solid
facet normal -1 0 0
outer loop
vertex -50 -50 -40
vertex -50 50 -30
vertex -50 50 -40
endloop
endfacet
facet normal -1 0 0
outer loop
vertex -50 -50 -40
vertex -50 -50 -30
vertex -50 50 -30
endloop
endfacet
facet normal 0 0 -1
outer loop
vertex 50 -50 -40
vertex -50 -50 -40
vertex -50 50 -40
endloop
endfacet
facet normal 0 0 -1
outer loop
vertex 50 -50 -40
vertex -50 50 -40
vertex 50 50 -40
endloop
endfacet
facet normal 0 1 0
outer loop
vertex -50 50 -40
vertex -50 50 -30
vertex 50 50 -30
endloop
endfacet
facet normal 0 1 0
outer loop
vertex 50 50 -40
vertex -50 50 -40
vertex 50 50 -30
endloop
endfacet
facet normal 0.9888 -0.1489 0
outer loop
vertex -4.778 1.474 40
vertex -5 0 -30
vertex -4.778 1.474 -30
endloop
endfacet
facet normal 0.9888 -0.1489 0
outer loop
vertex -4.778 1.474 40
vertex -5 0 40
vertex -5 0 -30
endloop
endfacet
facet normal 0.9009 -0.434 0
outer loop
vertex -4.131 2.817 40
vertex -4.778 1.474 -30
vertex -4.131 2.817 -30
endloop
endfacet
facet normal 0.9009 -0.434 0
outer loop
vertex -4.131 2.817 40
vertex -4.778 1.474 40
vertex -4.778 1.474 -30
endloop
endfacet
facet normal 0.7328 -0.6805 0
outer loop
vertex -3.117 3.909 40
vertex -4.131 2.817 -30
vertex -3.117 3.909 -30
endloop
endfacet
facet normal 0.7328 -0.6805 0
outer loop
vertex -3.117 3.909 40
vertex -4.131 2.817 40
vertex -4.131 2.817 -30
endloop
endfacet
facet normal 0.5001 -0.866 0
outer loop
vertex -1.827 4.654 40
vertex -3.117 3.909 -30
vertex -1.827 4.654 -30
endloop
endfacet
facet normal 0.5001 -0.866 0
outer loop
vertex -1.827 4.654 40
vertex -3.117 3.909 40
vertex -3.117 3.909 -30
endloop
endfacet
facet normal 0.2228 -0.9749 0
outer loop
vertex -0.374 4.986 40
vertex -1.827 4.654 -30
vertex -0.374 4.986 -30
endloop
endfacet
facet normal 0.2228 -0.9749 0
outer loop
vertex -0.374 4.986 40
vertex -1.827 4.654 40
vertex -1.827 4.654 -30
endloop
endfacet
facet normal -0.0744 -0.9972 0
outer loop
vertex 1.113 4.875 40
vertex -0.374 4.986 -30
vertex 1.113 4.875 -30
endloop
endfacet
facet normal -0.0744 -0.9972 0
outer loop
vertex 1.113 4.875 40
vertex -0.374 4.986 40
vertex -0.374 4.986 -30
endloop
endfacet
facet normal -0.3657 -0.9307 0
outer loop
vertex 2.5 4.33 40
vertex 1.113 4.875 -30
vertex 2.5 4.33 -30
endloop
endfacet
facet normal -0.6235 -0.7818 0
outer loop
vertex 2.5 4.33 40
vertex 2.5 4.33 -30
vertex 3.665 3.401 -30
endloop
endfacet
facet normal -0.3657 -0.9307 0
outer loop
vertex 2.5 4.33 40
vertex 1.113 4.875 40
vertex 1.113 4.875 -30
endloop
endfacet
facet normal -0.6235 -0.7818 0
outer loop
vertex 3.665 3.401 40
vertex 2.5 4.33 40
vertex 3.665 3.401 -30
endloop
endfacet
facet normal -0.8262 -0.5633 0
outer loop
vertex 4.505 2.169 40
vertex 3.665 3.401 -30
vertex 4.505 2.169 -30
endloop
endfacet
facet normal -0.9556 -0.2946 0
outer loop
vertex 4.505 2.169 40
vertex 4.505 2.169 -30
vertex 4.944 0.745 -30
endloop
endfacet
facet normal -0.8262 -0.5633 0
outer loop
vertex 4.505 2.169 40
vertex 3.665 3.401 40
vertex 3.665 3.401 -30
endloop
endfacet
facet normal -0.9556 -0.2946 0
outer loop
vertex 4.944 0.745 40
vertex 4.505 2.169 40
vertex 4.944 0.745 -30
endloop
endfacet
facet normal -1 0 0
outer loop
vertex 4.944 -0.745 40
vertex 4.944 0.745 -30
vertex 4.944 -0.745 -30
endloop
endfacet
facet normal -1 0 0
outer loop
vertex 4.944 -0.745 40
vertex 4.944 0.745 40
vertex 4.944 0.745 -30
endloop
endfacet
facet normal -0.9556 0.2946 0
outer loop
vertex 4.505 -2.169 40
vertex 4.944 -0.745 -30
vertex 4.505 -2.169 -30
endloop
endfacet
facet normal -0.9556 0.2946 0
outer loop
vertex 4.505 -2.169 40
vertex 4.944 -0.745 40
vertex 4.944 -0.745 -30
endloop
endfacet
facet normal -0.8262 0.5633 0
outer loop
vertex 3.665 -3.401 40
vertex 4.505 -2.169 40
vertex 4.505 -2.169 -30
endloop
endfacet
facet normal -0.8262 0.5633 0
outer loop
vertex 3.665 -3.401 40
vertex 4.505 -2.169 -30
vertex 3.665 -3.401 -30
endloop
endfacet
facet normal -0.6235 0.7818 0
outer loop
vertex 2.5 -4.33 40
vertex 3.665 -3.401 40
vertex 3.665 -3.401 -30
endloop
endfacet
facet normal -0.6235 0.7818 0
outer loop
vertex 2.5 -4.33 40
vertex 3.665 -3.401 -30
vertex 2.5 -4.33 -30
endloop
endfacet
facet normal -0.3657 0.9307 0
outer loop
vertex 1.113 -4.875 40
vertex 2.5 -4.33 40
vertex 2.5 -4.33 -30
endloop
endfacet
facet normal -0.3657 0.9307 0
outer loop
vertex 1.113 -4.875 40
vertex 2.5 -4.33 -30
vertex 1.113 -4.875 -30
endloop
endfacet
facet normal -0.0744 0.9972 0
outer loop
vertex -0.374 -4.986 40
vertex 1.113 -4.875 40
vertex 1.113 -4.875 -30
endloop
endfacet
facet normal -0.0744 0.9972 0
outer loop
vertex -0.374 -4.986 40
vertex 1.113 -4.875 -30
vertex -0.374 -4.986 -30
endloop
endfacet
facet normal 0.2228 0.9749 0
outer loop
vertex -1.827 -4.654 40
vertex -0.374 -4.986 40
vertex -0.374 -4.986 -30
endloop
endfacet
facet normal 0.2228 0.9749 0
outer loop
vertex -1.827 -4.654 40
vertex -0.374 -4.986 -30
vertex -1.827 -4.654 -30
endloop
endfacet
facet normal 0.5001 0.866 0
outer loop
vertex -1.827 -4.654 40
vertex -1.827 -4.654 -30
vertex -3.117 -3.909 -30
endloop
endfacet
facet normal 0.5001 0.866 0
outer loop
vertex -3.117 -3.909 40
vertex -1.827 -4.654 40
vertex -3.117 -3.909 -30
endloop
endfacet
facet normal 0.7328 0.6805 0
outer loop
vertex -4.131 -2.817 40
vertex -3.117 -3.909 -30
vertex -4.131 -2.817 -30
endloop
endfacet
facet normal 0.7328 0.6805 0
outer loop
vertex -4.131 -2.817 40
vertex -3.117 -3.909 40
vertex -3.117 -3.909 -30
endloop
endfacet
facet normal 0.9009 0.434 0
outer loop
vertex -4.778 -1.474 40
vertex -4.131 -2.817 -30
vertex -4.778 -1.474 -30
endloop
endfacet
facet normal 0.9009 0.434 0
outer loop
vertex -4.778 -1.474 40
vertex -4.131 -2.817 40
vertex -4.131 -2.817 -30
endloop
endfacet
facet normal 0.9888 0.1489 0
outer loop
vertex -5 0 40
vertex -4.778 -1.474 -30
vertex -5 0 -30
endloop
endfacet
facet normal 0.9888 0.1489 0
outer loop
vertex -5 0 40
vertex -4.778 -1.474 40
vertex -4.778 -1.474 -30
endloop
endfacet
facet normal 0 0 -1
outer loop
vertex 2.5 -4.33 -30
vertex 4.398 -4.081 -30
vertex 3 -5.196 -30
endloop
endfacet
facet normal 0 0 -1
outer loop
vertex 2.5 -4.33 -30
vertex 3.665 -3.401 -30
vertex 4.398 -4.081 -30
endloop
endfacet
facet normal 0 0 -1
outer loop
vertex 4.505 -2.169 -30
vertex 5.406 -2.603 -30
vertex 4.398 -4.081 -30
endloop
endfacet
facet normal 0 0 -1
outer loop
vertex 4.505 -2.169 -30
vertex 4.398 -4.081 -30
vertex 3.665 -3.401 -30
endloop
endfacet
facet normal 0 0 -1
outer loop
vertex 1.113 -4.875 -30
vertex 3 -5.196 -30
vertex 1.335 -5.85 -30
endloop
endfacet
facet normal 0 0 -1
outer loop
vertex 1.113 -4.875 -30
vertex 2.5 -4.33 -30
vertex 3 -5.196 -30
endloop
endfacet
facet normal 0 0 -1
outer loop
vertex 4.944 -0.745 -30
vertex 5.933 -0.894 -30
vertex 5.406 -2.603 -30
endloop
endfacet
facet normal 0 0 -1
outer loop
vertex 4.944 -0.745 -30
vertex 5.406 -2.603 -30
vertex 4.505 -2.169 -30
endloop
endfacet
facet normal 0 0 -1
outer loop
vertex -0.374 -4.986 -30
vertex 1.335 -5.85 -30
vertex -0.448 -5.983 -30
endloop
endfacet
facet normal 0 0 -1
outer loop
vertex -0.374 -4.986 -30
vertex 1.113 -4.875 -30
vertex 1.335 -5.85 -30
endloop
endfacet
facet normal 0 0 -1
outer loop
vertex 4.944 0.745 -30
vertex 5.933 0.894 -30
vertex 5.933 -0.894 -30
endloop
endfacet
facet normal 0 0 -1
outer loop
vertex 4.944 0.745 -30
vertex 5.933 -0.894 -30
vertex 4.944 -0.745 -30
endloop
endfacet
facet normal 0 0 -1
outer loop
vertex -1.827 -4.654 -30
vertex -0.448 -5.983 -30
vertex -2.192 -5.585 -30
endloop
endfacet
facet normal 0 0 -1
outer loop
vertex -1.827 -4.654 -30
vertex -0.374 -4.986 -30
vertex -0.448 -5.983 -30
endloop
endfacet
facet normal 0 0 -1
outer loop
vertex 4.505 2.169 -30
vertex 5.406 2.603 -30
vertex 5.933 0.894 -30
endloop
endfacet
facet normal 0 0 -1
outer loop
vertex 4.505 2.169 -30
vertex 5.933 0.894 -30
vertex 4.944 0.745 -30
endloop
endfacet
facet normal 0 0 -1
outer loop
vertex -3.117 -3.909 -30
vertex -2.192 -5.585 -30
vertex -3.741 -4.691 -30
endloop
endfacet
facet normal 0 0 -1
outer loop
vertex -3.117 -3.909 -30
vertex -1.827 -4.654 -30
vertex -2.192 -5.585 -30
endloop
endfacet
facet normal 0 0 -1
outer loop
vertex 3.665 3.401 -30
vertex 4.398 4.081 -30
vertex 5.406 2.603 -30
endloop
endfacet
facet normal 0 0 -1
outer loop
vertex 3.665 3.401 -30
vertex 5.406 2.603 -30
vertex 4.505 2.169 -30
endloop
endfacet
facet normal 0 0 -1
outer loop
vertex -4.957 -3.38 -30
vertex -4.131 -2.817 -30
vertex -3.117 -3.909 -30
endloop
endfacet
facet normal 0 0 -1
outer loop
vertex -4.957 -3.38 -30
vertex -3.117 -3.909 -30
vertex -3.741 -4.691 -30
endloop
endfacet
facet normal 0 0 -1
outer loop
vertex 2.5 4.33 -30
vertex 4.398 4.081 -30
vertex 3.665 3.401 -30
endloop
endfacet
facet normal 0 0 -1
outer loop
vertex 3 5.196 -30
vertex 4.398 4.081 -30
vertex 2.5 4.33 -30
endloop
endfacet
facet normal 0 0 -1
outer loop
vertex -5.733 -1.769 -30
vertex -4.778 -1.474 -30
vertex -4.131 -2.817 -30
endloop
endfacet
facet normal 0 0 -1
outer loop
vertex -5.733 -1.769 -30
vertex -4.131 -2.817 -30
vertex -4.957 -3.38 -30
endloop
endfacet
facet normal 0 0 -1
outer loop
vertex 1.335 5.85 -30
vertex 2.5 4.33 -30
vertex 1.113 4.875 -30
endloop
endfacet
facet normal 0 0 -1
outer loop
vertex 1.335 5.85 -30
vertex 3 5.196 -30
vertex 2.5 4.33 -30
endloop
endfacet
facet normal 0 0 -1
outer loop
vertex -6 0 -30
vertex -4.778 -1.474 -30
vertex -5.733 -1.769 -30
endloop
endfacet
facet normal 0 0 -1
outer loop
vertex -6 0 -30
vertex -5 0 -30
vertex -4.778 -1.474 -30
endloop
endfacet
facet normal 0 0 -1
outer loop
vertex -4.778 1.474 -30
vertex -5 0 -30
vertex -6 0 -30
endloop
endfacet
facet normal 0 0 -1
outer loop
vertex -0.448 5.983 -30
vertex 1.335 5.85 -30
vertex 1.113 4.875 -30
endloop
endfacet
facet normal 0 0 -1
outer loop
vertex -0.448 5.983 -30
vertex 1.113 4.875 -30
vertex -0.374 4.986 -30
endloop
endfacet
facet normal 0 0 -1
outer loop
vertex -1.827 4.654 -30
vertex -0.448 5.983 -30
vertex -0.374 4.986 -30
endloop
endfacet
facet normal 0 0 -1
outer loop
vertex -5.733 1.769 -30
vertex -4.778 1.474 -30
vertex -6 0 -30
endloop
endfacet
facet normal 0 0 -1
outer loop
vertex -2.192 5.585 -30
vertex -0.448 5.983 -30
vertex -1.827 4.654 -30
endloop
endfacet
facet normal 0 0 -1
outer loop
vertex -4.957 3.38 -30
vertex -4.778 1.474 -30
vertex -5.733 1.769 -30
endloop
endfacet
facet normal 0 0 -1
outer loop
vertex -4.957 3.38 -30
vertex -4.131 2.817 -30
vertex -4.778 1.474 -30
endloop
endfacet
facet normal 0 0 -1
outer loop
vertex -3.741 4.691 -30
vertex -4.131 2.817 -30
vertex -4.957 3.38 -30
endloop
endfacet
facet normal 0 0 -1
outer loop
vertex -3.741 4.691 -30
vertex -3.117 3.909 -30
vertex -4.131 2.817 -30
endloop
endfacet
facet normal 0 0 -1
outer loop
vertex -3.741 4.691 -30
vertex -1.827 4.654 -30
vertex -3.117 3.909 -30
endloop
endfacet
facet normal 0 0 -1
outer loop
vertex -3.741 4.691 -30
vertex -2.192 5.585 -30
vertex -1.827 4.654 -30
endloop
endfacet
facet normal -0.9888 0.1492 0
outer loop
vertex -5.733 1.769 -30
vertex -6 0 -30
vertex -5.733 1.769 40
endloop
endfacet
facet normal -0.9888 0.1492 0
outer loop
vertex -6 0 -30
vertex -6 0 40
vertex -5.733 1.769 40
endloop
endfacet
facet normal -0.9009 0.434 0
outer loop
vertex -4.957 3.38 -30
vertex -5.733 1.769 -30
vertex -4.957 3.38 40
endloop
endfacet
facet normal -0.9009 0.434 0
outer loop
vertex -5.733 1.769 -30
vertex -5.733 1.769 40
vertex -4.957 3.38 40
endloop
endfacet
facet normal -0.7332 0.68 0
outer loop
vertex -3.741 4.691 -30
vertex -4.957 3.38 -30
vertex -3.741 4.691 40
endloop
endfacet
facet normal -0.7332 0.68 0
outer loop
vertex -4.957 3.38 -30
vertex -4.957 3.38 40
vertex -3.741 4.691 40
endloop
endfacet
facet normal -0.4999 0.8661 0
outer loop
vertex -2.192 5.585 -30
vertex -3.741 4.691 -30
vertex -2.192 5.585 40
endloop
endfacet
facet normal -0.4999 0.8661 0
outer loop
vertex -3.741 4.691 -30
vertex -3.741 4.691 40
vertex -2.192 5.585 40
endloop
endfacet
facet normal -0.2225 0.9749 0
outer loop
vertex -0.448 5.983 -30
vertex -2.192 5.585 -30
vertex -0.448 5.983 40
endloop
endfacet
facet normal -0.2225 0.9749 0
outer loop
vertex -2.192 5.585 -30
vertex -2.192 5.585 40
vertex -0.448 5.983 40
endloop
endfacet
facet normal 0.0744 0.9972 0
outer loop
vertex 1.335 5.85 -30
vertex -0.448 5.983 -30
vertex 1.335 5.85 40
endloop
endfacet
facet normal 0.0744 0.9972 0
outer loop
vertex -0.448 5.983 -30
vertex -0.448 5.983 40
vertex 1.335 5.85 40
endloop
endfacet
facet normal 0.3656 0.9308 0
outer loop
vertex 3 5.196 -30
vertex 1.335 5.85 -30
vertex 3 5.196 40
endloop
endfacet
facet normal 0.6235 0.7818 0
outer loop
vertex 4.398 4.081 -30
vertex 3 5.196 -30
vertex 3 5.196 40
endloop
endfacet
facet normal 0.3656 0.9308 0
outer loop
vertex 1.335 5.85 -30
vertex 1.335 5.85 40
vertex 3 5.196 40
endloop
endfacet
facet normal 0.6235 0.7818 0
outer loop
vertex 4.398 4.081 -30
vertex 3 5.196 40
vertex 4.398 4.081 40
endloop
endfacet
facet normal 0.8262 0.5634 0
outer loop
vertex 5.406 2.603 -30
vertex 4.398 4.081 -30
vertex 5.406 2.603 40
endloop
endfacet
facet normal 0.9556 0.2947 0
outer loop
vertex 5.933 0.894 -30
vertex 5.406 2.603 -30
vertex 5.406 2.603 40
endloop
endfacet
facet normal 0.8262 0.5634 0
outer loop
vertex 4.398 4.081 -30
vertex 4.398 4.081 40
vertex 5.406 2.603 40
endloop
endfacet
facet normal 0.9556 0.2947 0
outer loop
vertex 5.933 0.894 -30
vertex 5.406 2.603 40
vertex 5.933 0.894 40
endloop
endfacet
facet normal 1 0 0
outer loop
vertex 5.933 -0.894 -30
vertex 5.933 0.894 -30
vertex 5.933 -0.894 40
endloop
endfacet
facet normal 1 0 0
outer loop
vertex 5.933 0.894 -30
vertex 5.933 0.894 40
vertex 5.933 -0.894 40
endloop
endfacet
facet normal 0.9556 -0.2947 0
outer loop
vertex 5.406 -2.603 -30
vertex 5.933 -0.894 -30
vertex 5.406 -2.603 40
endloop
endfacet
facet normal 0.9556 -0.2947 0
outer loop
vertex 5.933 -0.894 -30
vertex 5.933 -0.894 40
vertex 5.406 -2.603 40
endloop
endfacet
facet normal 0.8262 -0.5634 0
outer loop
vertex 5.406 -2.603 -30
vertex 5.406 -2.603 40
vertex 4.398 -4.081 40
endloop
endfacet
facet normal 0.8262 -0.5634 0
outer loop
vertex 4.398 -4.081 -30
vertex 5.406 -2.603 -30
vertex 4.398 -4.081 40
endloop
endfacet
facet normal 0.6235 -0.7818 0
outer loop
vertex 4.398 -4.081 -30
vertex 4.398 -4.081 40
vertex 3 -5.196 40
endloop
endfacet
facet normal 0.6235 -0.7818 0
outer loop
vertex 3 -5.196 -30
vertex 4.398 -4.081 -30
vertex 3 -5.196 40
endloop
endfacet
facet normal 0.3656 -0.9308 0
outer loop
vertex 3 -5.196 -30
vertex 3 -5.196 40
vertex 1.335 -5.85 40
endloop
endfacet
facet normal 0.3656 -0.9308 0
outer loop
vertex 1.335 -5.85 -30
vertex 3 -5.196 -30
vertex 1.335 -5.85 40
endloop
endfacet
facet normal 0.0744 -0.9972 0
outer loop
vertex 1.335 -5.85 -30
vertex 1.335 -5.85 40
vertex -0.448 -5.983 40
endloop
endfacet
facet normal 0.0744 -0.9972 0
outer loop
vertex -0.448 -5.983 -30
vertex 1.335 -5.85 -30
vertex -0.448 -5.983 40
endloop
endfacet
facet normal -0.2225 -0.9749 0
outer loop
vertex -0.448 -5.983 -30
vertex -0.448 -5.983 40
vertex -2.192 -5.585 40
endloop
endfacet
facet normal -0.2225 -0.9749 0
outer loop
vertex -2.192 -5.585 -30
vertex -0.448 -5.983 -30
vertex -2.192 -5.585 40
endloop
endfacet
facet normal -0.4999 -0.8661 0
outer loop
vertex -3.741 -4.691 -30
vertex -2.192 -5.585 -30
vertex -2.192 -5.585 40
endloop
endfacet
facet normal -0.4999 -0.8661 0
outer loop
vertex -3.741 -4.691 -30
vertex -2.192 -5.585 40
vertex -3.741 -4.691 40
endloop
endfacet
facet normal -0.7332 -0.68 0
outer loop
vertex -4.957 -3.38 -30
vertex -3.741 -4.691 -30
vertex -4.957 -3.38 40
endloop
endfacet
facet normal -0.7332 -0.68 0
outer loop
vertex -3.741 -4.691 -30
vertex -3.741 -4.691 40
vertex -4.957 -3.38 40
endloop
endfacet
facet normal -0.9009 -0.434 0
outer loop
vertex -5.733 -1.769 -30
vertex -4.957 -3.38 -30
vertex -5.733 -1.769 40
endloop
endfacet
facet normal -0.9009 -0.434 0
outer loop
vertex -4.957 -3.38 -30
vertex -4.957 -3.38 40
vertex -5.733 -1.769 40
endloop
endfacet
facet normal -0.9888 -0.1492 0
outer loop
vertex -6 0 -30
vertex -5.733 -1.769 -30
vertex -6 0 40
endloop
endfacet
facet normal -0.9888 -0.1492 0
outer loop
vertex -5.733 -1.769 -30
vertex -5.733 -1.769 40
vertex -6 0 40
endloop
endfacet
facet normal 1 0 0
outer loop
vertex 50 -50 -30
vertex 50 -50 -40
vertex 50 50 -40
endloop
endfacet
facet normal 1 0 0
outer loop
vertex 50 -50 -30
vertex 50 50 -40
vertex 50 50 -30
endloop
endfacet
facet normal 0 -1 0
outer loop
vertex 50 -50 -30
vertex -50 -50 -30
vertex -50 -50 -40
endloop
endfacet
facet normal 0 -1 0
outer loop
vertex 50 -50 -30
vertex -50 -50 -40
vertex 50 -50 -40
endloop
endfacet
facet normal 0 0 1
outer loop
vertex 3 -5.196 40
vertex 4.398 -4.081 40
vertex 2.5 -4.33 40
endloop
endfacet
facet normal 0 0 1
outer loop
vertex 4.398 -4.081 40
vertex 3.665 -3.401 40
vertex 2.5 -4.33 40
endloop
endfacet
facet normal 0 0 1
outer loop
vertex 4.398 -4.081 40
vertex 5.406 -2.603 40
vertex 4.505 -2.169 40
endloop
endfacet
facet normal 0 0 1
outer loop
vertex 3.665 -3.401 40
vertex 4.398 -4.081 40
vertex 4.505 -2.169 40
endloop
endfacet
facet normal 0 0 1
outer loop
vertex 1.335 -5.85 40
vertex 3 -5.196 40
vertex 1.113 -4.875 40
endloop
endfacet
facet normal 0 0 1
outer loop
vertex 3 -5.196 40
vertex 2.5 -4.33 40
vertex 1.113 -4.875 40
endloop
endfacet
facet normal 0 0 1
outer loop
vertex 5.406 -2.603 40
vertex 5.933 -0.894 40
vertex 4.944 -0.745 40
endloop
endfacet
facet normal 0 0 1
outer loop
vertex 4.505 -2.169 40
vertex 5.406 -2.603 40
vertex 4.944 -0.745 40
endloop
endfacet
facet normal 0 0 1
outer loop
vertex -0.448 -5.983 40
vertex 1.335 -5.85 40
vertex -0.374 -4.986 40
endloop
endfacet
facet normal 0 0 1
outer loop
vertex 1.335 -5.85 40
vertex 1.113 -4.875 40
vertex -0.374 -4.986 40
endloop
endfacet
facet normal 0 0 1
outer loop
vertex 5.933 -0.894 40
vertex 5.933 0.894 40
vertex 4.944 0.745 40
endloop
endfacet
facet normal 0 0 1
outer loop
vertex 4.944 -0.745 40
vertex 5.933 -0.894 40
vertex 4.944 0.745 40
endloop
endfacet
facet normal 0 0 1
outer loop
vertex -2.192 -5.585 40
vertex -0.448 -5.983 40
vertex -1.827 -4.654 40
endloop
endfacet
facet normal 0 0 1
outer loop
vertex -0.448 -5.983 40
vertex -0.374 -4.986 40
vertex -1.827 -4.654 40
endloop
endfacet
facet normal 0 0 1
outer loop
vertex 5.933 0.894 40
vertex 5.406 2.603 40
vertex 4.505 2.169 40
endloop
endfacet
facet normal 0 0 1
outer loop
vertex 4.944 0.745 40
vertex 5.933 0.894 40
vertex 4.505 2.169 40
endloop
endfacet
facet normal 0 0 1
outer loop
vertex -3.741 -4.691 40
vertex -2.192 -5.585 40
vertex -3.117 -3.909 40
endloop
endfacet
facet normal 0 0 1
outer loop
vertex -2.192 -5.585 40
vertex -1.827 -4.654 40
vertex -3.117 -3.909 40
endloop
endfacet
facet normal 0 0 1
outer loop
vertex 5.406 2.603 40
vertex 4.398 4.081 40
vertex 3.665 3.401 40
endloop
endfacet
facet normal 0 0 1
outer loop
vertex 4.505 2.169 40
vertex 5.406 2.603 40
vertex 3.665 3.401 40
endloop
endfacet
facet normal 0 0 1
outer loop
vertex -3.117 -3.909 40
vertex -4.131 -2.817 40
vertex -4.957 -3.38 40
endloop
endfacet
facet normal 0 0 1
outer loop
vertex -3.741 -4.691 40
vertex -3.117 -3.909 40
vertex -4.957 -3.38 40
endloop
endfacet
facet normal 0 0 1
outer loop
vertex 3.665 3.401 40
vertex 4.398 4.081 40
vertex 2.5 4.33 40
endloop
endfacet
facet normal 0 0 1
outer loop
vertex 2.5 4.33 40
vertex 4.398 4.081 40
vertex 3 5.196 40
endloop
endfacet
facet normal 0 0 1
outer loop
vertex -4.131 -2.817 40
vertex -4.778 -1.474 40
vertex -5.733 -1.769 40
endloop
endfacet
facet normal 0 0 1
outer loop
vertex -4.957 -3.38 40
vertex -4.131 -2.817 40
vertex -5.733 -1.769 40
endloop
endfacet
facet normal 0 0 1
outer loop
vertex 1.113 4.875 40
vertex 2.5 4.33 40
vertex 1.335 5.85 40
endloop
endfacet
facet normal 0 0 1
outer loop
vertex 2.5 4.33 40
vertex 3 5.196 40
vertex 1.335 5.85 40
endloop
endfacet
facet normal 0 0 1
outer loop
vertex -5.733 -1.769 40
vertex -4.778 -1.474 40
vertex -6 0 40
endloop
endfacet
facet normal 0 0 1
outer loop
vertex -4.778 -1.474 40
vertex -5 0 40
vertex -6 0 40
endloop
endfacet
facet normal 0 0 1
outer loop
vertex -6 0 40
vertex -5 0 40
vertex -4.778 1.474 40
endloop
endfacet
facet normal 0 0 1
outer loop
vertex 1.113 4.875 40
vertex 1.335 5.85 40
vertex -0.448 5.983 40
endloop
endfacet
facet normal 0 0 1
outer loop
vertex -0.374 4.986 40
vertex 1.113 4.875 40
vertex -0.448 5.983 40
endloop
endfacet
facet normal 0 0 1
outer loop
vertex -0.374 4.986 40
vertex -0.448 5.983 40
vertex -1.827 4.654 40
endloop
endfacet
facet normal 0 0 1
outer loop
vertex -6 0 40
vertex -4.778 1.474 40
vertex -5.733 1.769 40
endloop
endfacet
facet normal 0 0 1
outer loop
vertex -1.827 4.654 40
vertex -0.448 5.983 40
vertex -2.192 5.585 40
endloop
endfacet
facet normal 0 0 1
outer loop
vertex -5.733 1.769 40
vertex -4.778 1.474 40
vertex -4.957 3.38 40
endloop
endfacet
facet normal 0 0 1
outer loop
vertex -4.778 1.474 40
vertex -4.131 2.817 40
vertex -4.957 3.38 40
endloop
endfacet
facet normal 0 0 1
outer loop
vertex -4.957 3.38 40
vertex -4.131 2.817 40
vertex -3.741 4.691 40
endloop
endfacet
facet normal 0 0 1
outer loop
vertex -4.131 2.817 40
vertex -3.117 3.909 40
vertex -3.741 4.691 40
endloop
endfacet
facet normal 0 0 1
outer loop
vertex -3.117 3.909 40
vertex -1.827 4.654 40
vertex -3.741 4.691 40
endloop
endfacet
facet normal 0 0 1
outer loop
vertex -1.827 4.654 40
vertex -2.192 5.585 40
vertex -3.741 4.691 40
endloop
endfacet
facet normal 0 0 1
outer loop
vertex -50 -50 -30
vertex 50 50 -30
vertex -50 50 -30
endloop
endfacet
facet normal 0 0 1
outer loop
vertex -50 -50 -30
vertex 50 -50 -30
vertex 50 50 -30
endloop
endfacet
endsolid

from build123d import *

# Parameters (mm, degrees)
F1_DEPTH = 50
F0_W     = 1
F0_H     = 70


with BuildPart() as f1:
    # F0 (on Front) → F1 (new body, symmetric)
    with BuildSketch(Plane.XZ):
        Polygon((-6, -30), (-50, -30), (-50, -40), (50, -40), (50, -30), (-5, -30), align=None)
    extrude(amount=F1_DEPTH, both=True)


with BuildPart() as f2:
    # F0 (on Front) → F2 (revolve)
    with BuildSketch(Plane.XZ):
        with Locations((-5.5, 5)):
            Rectangle(F0_W, F0_H)
    revolve(axis=Axis((0, 0, 2.372671), (0, 0, -1)))


solid = Compound([f1.part, f2.part])
